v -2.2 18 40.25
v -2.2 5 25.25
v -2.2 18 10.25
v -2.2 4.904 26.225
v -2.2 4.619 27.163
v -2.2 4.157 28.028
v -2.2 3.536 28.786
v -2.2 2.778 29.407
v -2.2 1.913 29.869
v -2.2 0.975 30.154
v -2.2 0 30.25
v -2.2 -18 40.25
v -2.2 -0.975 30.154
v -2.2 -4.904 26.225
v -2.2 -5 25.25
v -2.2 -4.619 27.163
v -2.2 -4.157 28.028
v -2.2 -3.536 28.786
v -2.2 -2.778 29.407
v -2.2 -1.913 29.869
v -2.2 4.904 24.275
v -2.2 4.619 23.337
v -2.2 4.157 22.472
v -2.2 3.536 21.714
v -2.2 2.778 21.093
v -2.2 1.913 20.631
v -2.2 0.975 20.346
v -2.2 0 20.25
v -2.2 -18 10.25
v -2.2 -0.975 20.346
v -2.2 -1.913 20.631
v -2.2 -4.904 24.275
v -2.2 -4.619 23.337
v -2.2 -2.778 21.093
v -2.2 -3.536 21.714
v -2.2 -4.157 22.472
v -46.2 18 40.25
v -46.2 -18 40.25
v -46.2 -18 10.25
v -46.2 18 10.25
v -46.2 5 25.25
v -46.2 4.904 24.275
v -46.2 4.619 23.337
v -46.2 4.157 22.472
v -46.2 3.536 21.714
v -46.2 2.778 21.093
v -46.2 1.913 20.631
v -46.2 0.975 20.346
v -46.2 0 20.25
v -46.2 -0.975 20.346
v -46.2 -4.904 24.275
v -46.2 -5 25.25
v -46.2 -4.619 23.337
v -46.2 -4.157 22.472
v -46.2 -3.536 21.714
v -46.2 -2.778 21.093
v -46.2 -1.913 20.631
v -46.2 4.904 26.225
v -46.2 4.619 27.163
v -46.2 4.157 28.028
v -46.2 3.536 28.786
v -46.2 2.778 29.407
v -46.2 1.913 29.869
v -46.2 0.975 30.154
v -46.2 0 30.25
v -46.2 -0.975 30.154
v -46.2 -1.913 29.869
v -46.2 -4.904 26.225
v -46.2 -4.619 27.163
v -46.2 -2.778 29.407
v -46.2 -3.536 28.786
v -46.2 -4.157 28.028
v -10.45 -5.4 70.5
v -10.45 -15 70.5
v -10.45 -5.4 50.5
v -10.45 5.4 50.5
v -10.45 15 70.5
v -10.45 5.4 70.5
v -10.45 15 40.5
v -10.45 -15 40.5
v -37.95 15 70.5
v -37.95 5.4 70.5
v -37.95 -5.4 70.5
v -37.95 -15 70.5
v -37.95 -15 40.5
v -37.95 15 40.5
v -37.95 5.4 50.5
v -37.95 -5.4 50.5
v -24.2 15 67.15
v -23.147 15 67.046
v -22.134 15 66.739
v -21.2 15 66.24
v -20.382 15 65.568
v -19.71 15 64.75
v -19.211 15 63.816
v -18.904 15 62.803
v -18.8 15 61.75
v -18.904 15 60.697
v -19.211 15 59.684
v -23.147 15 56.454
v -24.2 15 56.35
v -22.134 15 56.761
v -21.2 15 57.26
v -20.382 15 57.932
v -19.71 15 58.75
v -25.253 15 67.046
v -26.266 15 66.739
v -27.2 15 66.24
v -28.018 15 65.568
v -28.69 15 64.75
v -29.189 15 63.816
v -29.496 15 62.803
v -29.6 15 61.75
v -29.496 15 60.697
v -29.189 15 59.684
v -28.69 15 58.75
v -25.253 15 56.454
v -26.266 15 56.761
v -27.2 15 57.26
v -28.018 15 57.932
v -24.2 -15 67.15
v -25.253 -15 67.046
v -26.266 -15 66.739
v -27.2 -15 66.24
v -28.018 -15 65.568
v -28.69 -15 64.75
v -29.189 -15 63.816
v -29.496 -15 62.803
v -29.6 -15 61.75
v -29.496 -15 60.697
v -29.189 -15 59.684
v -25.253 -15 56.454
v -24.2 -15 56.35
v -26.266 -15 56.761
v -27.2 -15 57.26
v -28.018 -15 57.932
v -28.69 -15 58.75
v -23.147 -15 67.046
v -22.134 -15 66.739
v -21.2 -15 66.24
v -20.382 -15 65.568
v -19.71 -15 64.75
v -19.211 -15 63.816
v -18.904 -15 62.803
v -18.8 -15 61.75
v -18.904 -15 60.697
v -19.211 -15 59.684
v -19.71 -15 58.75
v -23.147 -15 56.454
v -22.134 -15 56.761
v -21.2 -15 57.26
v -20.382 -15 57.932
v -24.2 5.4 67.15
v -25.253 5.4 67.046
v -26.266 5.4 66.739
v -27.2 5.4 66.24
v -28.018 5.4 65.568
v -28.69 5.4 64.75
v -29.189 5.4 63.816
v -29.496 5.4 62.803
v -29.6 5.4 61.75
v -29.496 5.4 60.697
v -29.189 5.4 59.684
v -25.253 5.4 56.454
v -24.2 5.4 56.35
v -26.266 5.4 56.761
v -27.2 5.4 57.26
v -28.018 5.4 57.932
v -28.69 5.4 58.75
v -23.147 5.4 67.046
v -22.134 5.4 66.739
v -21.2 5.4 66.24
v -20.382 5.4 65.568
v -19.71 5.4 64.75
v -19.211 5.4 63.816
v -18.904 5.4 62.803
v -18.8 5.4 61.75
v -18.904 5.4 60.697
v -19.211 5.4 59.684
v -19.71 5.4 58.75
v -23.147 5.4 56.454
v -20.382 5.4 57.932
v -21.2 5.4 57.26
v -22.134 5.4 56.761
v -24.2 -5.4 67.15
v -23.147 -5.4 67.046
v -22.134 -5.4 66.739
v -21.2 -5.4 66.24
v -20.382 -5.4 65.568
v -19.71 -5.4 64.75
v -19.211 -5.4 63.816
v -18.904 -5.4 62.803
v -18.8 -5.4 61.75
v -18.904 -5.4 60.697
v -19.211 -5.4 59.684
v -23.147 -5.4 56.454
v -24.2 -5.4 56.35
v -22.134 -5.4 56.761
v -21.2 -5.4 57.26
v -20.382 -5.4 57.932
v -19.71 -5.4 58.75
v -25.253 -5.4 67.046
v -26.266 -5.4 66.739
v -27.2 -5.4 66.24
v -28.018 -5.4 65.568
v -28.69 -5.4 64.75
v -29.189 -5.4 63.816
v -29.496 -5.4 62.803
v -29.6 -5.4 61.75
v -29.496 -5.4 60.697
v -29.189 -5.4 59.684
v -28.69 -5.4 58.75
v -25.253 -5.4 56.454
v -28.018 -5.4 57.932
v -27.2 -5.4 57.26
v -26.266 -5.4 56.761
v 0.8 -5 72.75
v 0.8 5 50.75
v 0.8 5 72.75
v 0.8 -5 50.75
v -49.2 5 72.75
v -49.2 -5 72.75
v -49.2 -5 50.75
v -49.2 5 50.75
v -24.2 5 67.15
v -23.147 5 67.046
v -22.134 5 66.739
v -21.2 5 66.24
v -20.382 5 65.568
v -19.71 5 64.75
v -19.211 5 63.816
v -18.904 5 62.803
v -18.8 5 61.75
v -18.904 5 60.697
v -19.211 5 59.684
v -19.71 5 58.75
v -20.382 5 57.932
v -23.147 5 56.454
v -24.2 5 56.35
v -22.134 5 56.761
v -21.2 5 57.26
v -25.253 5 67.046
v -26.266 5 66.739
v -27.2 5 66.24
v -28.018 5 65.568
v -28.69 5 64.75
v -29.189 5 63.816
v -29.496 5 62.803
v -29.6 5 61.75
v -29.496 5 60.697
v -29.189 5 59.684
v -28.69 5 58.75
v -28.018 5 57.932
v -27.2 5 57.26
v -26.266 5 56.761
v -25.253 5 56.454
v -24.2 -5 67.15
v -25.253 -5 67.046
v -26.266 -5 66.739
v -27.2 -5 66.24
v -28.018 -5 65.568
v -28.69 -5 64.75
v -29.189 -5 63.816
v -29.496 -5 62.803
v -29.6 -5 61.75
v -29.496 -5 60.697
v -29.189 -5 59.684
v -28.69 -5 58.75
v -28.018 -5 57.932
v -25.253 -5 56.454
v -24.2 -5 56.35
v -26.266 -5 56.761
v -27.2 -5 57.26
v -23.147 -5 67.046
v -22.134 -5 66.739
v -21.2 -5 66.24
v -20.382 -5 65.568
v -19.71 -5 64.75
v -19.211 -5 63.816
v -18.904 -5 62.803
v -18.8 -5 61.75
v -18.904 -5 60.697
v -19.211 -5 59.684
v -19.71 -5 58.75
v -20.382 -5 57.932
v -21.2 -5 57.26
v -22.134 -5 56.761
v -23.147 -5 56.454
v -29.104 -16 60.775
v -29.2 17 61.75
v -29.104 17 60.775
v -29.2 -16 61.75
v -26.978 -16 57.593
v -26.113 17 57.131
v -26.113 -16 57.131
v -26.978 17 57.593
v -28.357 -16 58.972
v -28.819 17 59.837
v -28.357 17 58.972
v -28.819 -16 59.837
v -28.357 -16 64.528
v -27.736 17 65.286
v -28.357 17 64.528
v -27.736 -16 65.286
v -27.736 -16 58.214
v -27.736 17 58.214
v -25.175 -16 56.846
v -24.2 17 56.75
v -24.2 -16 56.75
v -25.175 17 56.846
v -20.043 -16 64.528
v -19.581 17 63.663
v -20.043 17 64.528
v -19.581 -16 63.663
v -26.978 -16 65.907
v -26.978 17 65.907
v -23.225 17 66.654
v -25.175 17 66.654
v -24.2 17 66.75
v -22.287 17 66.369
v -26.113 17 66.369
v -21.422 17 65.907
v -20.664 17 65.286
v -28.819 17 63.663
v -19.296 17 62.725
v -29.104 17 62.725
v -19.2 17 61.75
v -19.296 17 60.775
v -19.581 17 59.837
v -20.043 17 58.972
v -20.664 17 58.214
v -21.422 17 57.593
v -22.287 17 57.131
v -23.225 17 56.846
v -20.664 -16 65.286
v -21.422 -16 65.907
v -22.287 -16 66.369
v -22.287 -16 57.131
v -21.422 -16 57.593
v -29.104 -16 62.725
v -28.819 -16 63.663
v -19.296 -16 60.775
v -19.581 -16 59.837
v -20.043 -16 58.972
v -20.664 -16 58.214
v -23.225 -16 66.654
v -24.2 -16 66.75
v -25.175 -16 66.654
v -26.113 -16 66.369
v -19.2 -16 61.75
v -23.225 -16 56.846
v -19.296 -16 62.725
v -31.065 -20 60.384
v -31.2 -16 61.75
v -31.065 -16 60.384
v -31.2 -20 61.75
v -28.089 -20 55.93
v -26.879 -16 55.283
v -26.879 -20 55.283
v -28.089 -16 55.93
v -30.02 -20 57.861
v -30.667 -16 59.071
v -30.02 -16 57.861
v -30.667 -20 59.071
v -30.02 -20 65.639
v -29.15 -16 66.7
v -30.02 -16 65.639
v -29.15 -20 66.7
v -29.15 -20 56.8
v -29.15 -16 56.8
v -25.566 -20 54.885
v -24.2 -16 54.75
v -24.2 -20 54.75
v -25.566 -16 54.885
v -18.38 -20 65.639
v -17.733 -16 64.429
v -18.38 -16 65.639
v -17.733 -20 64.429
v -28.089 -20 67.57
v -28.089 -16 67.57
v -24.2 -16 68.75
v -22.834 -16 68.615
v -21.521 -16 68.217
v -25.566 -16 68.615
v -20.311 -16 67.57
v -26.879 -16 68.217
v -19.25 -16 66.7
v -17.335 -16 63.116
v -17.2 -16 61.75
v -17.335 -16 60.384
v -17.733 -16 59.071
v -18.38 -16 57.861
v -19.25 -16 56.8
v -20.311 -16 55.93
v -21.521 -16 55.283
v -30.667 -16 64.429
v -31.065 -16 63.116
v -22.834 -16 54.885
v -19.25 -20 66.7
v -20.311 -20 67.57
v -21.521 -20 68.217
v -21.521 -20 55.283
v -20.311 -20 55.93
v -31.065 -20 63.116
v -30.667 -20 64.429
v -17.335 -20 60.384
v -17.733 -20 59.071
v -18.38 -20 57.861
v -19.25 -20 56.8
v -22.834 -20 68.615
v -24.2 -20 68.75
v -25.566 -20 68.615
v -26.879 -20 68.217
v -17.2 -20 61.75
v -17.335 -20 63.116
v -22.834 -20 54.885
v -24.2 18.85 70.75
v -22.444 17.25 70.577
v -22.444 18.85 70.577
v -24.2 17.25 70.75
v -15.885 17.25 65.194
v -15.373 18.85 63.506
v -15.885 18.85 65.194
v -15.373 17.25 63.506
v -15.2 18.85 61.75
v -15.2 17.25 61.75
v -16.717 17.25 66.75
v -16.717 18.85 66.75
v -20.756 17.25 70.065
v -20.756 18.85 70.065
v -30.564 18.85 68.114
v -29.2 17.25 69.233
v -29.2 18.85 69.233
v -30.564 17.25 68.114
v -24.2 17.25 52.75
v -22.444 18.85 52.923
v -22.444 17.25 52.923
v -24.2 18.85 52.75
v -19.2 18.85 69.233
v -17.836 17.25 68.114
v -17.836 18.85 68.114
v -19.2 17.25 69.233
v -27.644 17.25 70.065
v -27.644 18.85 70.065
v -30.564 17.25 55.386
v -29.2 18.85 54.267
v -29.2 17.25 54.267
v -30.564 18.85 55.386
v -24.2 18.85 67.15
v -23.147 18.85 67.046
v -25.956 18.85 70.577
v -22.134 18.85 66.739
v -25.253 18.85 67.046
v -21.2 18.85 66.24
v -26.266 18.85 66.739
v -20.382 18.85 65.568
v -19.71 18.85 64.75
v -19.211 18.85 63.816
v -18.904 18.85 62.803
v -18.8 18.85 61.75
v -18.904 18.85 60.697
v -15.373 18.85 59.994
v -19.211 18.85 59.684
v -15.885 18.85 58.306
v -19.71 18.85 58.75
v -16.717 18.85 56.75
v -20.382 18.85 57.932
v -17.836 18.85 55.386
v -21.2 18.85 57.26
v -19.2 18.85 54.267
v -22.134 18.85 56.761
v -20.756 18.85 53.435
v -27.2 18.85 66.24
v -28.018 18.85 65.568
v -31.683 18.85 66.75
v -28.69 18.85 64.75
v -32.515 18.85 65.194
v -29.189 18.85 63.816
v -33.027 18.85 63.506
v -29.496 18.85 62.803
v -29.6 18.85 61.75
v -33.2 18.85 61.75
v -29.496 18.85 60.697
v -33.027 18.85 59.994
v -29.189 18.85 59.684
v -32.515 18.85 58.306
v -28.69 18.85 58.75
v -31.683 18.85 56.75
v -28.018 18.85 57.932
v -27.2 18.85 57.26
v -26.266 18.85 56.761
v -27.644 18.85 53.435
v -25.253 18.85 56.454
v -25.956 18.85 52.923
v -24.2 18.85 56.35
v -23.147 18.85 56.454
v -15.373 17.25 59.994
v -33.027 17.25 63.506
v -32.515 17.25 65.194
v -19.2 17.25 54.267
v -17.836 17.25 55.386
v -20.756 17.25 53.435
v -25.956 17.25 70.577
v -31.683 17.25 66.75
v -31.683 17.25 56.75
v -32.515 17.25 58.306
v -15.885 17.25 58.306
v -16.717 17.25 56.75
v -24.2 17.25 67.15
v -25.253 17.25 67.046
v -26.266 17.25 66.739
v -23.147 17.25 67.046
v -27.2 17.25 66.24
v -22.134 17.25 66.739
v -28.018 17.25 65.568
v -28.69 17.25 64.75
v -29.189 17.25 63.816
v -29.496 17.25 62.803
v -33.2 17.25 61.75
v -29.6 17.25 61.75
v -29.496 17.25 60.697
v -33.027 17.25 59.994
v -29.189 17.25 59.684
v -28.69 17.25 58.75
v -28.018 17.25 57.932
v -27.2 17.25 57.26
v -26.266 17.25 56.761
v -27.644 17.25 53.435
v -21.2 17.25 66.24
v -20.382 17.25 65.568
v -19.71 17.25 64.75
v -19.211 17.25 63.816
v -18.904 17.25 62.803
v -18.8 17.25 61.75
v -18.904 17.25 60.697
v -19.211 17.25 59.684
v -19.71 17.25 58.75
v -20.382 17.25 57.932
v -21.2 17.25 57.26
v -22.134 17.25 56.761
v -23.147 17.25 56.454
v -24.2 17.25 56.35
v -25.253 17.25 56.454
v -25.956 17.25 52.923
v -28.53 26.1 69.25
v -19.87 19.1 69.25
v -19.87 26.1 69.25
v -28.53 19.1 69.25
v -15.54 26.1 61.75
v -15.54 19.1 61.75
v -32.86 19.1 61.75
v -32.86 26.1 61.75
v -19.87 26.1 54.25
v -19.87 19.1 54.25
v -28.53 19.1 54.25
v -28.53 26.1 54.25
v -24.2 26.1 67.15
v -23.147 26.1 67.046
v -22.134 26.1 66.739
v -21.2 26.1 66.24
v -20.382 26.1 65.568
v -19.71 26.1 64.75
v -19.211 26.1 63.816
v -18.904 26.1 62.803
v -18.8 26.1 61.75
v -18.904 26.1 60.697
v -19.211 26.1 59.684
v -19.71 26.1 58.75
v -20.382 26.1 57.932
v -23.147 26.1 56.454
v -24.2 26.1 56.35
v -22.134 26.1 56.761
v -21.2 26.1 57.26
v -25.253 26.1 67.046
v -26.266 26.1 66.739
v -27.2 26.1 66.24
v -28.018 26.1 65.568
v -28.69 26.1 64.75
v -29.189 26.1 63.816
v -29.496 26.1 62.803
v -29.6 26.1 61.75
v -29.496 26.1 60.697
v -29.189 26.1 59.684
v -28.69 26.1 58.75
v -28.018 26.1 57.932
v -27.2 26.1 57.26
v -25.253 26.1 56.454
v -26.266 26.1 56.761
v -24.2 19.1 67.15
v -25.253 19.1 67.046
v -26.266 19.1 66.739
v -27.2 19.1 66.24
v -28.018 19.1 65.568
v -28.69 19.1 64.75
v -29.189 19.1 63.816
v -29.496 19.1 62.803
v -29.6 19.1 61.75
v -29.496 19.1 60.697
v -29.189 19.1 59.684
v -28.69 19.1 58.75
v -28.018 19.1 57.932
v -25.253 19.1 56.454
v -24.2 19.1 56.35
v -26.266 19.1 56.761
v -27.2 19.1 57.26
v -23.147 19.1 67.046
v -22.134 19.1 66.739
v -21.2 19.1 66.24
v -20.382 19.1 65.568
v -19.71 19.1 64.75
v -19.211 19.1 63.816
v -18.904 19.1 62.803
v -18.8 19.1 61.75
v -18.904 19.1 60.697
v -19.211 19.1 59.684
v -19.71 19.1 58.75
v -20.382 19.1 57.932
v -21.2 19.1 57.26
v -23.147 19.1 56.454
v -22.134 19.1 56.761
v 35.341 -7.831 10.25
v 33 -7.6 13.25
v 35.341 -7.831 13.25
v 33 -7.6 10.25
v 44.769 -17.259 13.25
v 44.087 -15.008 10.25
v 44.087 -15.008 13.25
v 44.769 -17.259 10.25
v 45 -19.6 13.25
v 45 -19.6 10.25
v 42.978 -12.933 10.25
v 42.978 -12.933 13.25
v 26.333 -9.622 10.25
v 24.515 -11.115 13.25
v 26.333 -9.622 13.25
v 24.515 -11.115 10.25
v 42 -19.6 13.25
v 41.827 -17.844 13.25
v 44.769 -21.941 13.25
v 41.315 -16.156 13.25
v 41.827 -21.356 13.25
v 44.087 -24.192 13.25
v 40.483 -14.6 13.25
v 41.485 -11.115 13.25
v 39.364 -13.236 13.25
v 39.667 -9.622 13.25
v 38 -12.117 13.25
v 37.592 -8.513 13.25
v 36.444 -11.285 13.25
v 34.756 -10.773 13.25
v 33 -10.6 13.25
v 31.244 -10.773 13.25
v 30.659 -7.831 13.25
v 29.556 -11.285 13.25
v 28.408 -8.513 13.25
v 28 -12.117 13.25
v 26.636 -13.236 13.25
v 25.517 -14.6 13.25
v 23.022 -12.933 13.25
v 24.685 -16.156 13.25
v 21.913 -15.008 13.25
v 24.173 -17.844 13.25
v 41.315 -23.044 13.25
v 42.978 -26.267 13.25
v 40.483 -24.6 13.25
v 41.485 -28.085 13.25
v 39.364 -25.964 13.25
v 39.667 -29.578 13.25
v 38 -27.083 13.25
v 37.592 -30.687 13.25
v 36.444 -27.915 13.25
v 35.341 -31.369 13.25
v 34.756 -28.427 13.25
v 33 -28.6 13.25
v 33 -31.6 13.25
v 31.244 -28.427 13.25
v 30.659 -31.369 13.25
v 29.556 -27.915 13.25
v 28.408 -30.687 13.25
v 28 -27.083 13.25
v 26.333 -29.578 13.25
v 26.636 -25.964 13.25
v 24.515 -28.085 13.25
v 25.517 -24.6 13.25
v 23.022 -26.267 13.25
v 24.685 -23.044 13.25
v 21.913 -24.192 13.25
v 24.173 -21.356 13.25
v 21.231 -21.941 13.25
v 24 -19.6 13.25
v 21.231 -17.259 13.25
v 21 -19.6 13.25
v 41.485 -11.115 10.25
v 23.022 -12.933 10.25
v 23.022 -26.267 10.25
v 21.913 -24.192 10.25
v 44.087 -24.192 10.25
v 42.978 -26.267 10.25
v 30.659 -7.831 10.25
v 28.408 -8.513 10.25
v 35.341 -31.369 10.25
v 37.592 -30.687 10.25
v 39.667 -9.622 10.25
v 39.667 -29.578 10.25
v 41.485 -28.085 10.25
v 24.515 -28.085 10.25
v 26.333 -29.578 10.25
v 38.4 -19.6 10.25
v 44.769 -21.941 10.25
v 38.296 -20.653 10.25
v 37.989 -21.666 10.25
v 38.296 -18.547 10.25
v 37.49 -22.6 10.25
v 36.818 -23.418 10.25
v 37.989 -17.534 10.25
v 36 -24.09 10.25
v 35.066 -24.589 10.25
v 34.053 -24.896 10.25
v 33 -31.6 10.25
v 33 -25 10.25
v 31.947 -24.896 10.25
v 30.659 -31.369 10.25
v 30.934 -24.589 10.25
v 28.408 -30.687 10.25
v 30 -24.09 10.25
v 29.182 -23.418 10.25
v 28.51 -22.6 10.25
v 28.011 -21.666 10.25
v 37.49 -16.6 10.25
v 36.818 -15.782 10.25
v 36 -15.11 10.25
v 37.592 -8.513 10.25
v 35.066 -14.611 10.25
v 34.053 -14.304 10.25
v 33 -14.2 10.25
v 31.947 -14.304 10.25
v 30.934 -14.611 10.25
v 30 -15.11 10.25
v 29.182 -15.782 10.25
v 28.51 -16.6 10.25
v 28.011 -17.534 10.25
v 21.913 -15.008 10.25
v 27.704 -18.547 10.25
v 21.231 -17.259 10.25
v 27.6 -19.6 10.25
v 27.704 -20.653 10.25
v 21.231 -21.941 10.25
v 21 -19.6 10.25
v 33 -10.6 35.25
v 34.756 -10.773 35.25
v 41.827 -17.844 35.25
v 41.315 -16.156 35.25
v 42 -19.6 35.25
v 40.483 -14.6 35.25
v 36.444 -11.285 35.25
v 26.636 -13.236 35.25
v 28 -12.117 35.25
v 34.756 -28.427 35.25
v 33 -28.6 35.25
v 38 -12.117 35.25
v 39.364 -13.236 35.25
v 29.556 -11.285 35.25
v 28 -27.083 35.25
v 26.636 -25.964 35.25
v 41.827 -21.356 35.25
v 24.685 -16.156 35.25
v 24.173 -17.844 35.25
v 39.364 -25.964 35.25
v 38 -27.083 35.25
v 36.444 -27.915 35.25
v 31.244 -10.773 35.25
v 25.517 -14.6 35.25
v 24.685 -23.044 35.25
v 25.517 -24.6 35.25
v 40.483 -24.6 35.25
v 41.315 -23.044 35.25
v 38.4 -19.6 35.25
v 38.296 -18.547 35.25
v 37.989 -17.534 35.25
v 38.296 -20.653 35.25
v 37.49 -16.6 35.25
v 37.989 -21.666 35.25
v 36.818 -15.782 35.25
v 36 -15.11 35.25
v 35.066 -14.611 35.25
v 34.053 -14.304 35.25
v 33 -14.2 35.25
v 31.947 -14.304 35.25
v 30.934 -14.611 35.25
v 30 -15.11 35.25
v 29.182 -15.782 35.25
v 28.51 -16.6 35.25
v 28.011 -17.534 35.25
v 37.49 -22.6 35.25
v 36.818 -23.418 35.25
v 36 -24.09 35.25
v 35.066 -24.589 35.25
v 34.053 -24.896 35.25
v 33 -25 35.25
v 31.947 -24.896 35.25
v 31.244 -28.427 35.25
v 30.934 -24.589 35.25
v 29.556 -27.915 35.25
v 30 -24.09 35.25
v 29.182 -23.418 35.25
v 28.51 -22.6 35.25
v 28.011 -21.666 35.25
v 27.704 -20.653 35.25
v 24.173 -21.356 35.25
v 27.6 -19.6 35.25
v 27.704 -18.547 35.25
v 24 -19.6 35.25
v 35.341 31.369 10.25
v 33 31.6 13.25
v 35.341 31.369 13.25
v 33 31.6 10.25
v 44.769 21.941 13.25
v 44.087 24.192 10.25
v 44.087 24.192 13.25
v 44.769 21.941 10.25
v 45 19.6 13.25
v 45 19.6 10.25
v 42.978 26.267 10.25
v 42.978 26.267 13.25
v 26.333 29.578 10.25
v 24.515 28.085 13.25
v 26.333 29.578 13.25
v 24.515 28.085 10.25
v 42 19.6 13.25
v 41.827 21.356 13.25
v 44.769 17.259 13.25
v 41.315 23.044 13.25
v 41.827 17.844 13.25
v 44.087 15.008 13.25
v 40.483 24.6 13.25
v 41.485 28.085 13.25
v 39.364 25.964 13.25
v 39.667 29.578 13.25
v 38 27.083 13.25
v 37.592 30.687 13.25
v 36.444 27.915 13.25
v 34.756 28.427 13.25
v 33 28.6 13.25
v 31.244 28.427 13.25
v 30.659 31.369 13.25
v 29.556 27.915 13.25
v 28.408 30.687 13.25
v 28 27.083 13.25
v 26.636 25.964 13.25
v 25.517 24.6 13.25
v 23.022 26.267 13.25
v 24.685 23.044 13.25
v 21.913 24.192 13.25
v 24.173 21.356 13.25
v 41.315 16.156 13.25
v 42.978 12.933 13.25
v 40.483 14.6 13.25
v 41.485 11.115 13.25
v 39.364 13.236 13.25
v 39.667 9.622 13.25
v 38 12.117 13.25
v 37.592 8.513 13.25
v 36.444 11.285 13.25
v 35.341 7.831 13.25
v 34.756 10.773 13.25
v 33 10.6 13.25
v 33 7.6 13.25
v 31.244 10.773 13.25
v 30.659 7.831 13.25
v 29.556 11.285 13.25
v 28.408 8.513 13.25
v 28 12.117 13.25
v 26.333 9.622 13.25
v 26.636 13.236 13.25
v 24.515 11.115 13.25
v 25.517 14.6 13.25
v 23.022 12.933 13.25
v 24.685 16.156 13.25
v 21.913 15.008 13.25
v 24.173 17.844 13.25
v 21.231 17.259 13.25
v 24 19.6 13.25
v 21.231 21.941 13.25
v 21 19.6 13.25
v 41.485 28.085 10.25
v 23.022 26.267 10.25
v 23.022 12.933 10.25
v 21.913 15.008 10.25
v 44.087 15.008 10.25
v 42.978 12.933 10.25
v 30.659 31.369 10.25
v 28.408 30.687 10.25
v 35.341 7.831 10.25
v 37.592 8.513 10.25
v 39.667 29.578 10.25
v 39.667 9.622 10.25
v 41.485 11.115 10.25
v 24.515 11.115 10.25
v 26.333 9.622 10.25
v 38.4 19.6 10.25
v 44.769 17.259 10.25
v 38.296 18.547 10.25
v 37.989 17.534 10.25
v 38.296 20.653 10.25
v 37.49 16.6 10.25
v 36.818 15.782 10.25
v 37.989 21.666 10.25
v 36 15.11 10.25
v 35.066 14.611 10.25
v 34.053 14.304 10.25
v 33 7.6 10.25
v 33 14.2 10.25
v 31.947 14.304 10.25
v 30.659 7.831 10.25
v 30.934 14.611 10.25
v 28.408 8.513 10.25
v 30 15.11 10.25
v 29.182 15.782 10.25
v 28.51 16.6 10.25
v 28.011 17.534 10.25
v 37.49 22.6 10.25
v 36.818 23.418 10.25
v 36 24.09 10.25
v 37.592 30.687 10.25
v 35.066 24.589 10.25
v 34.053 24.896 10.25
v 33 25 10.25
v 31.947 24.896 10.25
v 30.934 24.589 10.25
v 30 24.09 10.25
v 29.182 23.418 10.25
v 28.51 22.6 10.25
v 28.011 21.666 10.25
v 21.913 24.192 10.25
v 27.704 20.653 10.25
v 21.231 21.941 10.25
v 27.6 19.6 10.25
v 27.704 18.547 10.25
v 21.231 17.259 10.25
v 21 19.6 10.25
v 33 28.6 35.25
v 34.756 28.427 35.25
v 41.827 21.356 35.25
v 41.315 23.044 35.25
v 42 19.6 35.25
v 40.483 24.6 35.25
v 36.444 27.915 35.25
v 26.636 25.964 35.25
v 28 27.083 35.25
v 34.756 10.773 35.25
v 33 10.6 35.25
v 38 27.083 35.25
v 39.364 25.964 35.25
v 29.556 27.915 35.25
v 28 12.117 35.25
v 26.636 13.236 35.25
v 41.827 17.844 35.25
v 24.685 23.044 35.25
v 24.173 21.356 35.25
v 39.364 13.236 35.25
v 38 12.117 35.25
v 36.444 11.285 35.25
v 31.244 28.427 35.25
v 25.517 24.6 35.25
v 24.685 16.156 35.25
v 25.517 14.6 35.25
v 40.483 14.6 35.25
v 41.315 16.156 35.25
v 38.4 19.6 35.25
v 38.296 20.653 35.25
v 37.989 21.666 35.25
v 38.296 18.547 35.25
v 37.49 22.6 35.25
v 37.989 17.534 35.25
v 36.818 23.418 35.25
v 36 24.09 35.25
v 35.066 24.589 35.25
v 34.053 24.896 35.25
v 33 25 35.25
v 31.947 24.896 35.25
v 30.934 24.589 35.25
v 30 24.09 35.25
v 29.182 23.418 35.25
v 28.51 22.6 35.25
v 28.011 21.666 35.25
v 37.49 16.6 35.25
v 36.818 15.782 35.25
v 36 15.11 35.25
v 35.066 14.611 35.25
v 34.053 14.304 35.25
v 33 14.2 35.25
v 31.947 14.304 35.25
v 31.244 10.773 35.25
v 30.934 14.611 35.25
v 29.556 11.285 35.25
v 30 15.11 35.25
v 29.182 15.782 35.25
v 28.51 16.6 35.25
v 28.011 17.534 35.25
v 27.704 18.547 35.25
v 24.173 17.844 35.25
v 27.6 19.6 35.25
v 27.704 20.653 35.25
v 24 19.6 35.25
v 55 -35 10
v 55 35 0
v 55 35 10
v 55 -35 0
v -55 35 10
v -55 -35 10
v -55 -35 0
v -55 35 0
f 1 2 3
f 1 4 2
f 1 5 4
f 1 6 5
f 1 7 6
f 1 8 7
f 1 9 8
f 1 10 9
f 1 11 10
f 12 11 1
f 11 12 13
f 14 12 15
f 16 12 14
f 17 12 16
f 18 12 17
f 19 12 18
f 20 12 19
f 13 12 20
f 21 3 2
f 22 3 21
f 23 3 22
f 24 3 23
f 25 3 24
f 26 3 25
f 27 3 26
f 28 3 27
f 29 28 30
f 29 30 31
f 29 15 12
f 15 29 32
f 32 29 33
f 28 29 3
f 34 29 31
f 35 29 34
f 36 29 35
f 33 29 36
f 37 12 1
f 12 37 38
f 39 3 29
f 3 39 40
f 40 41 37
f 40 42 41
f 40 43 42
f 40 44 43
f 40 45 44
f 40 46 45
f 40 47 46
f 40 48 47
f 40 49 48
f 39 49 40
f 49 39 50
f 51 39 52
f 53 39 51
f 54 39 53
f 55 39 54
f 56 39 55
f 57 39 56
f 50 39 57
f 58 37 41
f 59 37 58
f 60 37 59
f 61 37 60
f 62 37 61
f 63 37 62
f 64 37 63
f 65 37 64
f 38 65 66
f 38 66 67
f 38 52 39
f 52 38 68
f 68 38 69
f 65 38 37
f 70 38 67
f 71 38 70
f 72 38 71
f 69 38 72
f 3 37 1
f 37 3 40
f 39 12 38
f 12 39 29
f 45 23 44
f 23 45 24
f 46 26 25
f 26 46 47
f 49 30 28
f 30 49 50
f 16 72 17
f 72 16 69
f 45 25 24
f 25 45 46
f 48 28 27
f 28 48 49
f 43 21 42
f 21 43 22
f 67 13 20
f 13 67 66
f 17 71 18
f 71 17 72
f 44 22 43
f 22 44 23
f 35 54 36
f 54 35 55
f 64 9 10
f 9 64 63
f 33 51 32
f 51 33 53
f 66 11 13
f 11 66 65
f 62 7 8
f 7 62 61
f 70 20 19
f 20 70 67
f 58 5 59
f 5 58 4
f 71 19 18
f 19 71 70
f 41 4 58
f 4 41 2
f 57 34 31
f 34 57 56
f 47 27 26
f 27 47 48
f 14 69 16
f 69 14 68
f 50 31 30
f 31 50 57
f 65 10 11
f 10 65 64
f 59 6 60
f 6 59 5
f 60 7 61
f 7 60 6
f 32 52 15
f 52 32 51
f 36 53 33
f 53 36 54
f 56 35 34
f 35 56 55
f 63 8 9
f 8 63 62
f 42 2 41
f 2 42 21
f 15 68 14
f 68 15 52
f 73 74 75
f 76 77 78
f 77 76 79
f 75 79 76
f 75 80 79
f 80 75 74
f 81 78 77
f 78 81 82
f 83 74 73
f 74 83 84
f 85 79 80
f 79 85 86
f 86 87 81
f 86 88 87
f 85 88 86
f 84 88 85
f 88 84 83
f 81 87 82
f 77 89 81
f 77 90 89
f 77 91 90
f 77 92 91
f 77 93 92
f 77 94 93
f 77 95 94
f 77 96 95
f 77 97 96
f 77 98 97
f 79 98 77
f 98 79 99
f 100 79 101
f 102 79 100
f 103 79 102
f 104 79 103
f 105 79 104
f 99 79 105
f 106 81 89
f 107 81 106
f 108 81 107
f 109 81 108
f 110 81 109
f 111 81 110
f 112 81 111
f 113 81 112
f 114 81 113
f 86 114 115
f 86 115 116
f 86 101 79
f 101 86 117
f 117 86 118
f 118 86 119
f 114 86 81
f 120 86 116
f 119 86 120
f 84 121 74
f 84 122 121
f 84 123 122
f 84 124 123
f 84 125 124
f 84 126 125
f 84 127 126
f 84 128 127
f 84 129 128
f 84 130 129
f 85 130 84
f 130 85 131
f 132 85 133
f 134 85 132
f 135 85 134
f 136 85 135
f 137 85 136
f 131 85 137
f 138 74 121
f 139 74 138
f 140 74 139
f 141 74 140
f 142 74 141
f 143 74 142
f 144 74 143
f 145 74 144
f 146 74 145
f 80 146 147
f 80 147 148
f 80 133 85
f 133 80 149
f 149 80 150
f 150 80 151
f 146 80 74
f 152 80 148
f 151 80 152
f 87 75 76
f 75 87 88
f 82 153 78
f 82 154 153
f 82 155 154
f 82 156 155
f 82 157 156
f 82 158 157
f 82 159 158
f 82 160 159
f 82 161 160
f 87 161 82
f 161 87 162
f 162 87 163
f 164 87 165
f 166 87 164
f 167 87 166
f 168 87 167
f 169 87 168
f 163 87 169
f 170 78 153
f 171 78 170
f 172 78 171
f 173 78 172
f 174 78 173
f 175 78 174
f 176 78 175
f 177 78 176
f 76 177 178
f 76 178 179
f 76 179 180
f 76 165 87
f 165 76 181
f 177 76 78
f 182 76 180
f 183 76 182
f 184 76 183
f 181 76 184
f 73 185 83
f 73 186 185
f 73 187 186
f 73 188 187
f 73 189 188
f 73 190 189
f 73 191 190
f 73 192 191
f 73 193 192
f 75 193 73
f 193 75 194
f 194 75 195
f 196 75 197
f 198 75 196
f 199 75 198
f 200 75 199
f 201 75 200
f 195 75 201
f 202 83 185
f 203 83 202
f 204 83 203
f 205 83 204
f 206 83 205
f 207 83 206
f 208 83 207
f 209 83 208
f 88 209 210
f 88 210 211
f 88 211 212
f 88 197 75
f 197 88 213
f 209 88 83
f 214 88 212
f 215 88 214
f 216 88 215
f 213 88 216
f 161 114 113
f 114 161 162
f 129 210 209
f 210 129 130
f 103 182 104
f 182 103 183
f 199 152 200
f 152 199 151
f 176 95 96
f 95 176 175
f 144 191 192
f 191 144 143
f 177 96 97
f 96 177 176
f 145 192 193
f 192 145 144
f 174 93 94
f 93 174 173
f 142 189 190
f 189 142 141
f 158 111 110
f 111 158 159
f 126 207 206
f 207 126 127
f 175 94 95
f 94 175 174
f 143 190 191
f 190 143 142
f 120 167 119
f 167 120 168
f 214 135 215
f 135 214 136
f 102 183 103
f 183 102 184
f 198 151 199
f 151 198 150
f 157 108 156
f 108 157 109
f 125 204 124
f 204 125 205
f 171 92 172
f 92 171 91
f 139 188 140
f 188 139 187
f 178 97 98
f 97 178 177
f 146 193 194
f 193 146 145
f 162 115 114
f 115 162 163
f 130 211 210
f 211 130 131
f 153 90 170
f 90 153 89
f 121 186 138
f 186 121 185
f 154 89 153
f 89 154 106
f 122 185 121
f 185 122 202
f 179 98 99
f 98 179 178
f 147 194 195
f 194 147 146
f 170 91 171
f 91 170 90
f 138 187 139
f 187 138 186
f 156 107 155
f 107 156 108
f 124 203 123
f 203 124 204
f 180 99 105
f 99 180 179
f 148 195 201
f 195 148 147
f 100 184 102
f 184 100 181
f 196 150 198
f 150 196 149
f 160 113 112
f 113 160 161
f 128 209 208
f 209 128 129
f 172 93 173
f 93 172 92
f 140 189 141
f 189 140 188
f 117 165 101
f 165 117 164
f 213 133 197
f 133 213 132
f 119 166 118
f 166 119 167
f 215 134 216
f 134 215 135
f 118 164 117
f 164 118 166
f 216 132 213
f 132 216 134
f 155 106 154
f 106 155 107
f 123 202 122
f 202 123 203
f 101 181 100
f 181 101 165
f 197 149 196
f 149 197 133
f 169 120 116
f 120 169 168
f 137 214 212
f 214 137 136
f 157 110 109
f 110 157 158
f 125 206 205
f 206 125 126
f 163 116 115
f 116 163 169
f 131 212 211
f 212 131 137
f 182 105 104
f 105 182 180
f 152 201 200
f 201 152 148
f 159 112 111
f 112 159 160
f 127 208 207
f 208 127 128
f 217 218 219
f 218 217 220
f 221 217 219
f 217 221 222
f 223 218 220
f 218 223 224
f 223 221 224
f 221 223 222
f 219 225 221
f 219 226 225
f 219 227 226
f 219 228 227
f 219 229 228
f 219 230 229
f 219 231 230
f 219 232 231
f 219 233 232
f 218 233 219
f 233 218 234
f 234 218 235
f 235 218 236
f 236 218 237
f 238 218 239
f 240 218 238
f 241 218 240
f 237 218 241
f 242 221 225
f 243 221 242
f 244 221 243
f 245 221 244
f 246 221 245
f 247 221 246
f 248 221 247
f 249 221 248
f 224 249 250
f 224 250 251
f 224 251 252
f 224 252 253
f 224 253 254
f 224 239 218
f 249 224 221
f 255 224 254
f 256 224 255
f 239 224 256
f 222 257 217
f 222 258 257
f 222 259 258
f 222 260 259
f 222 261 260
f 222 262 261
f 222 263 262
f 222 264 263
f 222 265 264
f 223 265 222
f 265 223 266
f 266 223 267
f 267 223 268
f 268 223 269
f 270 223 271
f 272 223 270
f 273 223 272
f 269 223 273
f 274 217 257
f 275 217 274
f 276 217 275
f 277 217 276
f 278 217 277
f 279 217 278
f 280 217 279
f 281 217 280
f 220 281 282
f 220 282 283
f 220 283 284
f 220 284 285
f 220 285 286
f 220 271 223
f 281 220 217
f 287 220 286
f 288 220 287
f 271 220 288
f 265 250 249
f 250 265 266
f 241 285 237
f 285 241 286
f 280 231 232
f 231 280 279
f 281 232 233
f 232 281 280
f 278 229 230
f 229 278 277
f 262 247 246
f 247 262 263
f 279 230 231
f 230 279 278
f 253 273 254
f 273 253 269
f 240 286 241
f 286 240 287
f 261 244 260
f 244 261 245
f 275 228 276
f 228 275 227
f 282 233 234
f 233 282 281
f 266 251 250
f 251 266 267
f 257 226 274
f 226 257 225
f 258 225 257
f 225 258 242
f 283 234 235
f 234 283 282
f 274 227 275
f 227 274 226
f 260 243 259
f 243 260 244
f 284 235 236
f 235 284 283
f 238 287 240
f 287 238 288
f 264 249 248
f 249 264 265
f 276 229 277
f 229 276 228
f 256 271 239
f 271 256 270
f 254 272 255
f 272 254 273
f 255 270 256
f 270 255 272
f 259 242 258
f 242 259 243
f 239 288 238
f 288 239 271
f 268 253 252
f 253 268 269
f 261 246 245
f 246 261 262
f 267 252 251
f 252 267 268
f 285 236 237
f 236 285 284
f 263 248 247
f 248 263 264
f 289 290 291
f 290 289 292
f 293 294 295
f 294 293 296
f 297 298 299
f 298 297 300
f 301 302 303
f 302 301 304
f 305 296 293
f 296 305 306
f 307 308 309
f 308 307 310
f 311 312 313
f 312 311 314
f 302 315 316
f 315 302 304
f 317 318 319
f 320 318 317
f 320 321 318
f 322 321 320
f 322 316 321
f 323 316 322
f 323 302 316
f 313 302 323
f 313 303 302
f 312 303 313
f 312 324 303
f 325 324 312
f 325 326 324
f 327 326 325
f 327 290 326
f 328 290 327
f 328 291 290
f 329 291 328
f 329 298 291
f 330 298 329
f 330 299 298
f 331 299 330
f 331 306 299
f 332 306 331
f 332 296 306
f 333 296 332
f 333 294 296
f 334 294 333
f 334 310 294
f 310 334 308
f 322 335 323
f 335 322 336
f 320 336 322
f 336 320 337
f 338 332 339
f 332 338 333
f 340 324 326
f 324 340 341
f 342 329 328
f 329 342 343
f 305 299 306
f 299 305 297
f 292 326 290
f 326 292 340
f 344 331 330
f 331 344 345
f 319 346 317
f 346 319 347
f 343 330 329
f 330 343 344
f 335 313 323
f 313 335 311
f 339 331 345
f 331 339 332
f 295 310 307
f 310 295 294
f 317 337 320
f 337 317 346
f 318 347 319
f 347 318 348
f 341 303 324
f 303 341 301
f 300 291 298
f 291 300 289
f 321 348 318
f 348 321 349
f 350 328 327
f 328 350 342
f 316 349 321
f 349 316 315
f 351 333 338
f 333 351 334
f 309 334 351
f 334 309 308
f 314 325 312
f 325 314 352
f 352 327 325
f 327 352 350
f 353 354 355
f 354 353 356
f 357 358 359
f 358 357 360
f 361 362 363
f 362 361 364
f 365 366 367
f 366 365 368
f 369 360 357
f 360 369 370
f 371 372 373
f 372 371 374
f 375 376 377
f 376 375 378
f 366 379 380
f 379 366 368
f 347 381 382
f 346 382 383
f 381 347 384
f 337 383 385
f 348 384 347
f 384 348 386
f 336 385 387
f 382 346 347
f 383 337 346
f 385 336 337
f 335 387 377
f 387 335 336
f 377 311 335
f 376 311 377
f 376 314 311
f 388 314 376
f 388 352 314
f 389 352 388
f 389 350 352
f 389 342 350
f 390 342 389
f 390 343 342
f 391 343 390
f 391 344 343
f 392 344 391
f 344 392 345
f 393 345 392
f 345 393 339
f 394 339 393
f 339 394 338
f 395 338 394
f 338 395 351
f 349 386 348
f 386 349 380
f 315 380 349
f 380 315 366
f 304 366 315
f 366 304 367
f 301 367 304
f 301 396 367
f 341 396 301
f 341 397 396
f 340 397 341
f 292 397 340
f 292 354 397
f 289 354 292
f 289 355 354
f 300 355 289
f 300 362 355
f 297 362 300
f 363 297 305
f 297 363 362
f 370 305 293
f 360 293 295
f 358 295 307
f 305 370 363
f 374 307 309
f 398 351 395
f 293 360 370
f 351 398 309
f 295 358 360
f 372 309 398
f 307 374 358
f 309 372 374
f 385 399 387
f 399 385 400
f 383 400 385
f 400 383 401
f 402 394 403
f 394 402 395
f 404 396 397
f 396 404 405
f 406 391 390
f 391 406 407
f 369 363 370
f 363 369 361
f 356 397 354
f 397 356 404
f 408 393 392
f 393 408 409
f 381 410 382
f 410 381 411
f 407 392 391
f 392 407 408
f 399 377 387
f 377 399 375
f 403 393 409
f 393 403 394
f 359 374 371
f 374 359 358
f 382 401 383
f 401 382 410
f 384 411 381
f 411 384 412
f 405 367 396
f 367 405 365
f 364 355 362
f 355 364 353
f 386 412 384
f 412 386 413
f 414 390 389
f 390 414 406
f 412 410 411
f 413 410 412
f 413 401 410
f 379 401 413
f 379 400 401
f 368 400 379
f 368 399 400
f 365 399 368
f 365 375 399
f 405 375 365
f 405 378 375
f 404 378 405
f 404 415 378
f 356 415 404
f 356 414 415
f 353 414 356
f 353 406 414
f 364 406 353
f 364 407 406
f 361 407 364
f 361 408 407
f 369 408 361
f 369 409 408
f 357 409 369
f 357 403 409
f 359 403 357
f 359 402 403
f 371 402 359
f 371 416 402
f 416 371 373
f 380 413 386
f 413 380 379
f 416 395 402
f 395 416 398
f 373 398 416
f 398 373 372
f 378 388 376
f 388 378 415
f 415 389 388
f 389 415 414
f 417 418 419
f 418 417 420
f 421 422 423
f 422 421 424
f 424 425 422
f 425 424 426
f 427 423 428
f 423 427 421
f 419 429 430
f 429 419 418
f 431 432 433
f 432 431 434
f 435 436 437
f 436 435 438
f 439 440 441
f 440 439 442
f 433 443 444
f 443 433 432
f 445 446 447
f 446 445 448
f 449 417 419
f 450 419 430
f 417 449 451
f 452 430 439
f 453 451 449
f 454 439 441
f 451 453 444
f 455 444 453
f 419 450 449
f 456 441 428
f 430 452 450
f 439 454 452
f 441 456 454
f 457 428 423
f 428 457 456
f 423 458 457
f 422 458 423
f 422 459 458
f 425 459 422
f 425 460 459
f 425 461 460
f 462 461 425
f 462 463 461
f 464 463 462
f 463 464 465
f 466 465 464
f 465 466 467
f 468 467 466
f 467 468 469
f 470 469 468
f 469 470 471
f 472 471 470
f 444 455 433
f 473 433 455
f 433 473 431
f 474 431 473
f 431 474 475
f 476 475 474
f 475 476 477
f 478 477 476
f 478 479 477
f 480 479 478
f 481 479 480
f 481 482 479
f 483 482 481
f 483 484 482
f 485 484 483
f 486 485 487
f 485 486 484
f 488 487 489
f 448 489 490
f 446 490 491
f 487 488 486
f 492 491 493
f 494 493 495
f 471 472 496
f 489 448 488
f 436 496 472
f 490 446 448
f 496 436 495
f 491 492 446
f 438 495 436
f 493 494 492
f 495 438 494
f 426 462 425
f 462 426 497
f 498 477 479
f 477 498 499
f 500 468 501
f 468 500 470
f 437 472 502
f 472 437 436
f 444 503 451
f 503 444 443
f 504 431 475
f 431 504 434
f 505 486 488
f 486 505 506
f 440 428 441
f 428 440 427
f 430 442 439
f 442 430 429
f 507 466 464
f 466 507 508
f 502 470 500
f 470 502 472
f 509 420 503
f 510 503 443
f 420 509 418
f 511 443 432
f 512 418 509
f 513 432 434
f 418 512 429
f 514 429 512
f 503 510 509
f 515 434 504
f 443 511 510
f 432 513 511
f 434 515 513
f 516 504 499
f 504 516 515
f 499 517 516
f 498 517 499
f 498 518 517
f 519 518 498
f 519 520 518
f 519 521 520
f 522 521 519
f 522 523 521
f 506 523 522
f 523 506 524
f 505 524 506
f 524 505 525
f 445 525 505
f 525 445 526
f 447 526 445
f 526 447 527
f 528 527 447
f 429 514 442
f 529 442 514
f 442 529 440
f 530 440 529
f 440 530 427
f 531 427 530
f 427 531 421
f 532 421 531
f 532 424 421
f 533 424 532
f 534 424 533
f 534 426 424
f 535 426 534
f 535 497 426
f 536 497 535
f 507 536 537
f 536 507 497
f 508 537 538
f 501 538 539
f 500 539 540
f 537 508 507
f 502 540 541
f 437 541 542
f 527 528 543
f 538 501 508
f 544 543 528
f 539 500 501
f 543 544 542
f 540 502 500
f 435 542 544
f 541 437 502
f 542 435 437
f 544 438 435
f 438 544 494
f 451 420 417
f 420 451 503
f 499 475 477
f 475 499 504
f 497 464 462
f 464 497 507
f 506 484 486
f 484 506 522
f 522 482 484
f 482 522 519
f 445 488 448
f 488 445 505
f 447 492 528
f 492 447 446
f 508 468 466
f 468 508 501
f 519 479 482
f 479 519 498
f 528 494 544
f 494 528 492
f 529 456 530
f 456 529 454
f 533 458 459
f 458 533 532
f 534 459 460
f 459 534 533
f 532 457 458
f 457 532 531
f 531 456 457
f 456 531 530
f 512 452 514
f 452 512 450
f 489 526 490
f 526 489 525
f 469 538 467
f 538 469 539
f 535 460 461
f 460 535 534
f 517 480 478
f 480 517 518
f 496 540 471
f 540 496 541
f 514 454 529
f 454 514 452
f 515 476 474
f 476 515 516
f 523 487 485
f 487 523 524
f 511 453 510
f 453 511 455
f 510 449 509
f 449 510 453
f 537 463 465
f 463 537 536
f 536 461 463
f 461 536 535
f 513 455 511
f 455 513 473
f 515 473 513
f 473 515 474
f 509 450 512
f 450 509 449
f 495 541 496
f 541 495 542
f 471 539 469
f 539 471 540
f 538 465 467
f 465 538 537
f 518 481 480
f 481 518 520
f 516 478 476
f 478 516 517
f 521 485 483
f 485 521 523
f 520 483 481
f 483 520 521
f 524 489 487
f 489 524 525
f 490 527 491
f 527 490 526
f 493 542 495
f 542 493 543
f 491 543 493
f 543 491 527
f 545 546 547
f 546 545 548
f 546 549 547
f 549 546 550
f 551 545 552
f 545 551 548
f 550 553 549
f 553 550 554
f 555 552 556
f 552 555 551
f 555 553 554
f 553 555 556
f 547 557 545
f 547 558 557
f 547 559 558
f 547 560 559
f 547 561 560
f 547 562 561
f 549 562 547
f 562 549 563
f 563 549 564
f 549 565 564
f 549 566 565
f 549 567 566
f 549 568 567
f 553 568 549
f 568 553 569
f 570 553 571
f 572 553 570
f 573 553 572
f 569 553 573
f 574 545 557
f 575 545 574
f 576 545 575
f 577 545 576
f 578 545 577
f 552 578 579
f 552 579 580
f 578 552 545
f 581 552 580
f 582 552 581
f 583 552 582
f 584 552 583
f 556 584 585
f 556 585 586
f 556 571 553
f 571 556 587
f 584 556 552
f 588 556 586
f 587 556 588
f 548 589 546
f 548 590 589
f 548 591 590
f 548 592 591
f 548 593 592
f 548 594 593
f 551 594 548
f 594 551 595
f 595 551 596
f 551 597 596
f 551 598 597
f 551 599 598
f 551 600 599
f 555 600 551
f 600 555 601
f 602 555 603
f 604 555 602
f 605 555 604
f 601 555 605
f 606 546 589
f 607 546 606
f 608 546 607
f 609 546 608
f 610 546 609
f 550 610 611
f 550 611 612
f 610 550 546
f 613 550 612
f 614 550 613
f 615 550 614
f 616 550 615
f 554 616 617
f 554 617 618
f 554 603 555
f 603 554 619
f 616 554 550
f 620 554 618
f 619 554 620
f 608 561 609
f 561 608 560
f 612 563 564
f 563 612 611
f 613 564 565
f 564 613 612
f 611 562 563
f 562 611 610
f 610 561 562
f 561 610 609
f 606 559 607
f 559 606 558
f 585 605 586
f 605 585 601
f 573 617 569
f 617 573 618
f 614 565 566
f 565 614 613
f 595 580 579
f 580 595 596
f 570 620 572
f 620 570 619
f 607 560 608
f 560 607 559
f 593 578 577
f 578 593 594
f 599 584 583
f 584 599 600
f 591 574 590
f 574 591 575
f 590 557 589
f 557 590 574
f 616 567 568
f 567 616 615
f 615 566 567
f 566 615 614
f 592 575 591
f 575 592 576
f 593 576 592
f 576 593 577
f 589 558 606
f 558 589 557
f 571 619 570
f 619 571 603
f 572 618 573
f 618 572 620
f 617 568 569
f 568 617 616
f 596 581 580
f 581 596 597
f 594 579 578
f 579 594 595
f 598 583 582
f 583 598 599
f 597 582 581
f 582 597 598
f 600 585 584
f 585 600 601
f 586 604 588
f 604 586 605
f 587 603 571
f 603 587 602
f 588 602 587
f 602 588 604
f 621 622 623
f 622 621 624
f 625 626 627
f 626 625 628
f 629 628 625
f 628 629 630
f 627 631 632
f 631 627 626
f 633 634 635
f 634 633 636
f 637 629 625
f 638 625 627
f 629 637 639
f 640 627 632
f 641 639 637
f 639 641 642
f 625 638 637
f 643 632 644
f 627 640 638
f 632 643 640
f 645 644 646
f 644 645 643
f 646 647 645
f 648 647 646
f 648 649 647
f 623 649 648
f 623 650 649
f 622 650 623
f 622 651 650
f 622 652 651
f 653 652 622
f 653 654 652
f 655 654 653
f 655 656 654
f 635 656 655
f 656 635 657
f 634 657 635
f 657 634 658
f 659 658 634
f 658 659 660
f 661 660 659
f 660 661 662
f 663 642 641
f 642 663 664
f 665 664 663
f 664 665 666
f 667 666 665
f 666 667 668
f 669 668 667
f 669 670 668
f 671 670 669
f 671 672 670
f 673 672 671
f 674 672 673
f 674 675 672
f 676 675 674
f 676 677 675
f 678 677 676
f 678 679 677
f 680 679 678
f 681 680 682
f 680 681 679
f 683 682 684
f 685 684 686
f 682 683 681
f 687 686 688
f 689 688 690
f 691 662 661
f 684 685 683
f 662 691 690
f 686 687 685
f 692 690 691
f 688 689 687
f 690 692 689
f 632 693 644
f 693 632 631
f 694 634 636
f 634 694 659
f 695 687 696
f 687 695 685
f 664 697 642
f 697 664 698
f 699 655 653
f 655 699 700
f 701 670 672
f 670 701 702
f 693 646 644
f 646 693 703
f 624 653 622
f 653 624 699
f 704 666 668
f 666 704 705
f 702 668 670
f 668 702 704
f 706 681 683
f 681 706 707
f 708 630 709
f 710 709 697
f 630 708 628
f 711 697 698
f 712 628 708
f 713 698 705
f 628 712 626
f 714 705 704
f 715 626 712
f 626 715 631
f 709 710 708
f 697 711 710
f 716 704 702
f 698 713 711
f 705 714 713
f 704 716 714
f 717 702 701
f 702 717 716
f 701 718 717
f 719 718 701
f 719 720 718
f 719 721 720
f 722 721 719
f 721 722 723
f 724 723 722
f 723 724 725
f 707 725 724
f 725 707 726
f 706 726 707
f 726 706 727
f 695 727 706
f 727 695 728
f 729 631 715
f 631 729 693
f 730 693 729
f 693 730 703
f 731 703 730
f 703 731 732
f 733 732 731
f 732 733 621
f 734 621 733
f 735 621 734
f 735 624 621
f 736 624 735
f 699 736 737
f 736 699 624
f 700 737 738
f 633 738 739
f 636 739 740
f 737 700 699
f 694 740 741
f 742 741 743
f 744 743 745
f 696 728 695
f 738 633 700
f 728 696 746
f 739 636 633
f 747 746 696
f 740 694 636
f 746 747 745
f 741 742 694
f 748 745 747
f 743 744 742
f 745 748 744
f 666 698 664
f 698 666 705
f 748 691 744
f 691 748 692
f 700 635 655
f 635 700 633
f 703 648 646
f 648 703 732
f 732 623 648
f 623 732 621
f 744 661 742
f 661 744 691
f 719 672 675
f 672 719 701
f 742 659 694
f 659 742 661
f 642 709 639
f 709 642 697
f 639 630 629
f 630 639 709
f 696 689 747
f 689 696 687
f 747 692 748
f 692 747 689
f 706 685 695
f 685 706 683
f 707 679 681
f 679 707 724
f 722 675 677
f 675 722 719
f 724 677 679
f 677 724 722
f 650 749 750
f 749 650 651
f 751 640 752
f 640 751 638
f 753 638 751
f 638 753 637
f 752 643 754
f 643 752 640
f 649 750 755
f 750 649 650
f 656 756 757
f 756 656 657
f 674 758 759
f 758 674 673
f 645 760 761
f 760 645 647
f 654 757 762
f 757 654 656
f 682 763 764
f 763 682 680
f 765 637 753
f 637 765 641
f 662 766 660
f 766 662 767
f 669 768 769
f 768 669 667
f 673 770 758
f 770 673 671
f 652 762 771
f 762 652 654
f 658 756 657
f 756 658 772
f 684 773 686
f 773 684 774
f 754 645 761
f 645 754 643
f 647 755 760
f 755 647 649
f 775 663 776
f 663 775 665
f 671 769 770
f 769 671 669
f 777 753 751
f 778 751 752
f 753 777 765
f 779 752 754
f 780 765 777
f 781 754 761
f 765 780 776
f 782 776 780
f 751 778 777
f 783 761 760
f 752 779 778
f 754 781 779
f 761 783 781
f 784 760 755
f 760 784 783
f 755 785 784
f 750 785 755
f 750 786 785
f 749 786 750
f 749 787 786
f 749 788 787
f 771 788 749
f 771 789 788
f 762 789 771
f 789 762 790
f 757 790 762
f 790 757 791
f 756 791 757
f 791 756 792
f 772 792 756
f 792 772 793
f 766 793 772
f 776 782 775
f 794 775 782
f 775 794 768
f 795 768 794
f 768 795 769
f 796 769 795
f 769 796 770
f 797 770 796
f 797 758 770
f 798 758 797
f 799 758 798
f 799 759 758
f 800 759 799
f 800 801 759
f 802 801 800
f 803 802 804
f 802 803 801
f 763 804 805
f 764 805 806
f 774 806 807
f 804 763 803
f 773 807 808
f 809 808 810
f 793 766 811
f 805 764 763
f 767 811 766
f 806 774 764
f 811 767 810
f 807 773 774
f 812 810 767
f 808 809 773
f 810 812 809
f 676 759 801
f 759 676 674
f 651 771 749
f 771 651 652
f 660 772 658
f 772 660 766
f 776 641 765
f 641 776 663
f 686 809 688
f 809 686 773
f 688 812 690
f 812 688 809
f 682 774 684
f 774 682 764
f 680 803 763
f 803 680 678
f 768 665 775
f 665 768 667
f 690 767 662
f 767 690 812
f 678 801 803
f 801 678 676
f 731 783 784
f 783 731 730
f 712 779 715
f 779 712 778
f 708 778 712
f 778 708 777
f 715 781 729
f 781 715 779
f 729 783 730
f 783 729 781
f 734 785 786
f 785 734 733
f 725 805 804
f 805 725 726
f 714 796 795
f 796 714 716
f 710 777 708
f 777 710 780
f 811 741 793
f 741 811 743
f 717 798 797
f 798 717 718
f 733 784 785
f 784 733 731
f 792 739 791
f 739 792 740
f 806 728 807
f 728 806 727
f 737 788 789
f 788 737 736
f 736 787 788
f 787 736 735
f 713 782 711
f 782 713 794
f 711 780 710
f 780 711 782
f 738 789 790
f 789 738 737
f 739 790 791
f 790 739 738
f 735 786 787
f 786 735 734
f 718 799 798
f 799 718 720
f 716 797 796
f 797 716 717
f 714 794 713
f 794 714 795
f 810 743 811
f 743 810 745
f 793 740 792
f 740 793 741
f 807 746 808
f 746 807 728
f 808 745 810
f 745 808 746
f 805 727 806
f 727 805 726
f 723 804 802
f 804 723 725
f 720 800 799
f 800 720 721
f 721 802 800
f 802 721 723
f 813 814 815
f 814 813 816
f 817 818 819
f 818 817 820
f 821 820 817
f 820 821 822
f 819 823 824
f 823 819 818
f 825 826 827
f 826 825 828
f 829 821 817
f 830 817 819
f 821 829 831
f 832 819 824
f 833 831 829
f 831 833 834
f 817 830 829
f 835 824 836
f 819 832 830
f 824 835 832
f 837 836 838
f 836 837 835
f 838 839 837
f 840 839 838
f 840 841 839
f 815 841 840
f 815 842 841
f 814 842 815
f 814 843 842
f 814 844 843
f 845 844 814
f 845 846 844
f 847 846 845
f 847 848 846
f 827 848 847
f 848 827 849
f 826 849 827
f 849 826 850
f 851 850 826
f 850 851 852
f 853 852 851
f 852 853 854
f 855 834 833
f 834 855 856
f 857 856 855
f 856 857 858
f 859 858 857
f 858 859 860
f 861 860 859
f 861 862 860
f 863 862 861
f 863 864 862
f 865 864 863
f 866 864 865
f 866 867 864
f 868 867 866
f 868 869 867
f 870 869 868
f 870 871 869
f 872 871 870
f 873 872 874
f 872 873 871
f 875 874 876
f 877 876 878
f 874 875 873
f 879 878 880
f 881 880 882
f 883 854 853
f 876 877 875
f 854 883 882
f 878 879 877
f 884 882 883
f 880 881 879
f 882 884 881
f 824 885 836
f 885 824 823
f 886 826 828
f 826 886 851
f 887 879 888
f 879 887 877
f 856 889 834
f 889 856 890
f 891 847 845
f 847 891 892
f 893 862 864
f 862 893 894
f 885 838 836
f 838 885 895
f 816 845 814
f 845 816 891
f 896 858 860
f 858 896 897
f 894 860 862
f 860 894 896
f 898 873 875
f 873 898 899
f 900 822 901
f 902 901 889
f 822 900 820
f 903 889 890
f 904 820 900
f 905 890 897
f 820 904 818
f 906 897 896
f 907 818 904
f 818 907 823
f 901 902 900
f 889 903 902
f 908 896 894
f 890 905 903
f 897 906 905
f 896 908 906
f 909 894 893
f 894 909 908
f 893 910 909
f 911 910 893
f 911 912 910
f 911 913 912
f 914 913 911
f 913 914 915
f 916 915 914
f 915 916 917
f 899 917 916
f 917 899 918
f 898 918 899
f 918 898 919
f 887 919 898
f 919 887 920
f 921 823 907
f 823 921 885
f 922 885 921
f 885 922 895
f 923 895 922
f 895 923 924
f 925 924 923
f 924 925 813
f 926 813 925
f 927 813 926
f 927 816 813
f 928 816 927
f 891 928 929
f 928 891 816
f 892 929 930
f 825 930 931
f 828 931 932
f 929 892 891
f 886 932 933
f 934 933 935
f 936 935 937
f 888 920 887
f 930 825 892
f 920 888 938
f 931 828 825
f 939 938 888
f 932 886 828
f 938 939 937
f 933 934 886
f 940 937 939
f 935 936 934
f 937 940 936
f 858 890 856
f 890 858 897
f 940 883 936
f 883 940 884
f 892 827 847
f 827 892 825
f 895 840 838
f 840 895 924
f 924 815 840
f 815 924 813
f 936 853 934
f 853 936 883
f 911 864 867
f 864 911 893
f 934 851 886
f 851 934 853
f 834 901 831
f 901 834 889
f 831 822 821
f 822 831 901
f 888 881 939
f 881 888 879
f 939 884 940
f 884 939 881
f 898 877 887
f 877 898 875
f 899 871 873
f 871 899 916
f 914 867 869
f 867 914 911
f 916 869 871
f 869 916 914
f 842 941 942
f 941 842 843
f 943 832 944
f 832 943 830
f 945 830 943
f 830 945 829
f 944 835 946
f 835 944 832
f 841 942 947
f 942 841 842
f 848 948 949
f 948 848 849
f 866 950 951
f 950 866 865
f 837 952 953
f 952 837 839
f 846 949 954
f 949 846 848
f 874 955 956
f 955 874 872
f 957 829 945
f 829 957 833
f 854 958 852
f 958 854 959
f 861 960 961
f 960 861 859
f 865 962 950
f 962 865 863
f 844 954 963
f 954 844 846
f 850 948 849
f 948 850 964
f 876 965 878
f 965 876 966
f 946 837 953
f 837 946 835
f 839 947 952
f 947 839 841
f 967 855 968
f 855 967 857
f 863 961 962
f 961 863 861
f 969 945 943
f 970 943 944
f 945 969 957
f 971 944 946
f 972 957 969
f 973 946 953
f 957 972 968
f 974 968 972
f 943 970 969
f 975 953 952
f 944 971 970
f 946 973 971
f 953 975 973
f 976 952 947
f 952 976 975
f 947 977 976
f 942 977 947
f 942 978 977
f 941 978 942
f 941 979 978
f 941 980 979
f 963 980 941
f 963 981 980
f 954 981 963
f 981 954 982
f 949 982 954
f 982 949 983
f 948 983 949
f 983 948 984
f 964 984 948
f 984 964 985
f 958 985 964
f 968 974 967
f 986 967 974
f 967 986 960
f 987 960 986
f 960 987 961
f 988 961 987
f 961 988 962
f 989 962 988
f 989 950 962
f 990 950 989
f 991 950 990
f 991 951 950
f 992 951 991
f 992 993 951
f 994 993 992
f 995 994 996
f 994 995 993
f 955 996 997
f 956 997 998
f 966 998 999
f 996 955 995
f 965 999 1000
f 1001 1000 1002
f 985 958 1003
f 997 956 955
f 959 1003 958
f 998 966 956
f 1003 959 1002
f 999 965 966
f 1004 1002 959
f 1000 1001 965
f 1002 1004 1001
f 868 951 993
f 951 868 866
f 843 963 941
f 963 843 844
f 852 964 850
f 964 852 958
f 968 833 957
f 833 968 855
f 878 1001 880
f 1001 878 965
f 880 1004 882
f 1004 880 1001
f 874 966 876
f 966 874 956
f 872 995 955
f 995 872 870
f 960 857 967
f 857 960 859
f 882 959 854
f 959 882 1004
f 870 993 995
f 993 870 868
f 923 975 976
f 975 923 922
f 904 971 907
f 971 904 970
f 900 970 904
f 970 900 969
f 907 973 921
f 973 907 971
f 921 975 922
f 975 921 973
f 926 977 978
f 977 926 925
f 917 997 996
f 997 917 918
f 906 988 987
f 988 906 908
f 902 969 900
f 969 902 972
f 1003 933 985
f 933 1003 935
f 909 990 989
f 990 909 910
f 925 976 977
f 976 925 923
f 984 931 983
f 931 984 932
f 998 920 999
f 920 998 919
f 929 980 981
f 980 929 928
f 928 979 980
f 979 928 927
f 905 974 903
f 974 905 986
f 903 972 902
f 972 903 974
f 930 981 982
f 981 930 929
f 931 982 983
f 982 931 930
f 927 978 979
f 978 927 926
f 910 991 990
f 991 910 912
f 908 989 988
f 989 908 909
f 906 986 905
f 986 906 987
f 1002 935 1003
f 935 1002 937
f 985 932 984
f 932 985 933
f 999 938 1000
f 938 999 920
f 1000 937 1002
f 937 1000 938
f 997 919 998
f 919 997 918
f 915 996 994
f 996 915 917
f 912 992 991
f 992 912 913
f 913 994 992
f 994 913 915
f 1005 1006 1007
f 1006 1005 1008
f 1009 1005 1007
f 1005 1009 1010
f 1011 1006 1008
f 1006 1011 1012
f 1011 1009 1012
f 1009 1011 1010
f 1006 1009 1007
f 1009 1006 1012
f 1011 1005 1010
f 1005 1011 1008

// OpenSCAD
$fn = 32;

// ------------------------------------------------------------------------
// Indexing jig: plate 110 x 70 mm, pin d10
// Every part is its own module, assembly() places every instance.
// ------------------------------------------------------------------------

// --- part 1 ---
module jig_plate() {
  difference() {
    translate([-55, -35, 0]) cube([110, 70, 10]);
  }
}

// --- part 2 ---
module locator_block() {
  difference() {
    translate([-22, -18, 0]) cube([44, 36, 30]);
    translate([0, 0, 15]) rotate([0, 90, 0]) cylinder(h = 46, d = 10, center = true);
  }
}

// --- part 3 ---
module index_fork() {
  difference() {
    translate([-13.75, -15, 0]) cube([27.5, 30, 30]);
    translate([-14.75, -5.4, 10]) cube([29.5, 10.8, 21]);
    translate([0, 0, 21.25]) rotate([90, 0, 0]) cylinder(h = 32, d = 10.8, center = true);
  }
}

// --- part 4 ---
module index_arm() {
  difference() {
    translate([-25, -5, 0]) cube([50, 10, 22]);
    translate([0, 0, 11]) rotate([90, 0, 0]) cylinder(h = 12, d = 10.8, center = true);
  }
}

// --- part 5 ---
module index_pin() {
  rotate([0, 90, 0]) cylinder(h = 34, d = 10, center = true);
  translate([-20, 0, 0]) rotate([0, 90, 0]) cylinder(h = 4, d = 14);
}

// --- part 6 ---
module pin_washer() {
  difference() {
      translate([0, 0, 0]) cylinder(h = 1.6, d = 18);
      translate([0, 0, -1]) cylinder(h = 3.6, d = 10.8);
    }
}

// --- part 7 ---
module lock_nut() {
  difference() {
    linear_extrude(height = 7) polygon(points = [[8.66, 0], [4.33, 7.5], [-4.33, 7.5], [-8.66, 0], [-4.33, -7.5], [4.33, -7.5]]);
    translate([0, 0, -1]) cylinder(h = 9, d = 10.8);
  }
}

// --- part 8 ---
module guide_bush_a() {
  difference() {
    union() {
      cylinder(h = 3, d = 24);
      translate([0, 0, 3]) cylinder(h = 22, d = 18);
    }
    translate([0, 0, -1]) cylinder(h = 27, d = 10.8);
  }
}

// --- part 9 ---
module guide_bush_b() {
  difference() {
    union() {
      cylinder(h = 3, d = 24);
      translate([0, 0, 3]) cylinder(h = 22, d = 18);
    }
    translate([0, 0, -1]) cylinder(h = 27, d = 10.8);
  }
}

// --- assembly ---
module assembly() {
  color([0.80, 0.24, 0.20]) translate([0, 0, 0]) rotate([0, 0, 0]) jig_plate();
  color([0.20, 0.45, 0.75]) translate([-24.2, 0, 10.25]) rotate([0, 0, 0]) locator_block();
  color([0.25, 0.62, 0.32]) translate([-24.2, 0, 40.5]) rotate([0, 0, 0]) index_fork();
  color([0.92, 0.70, 0.18]) translate([-24.2, 0, 50.75]) rotate([0, 0, 0]) index_arm();
  color([0.58, 0.35, 0.70]) translate([-24.2, 0, 61.75]) rotate([0, 0, 90]) index_pin();
  color([0.16, 0.66, 0.66]) translate([-24.2, 18.85, 61.75]) rotate([90, 0, 0]) pin_washer();
  color([0.85, 0.48, 0.18]) translate([-24.2, 26.1, 61.75]) rotate([90, 0, 0]) lock_nut();
  color([0.55, 0.60, 0.65]) translate([33, -19.6, 10.25]) rotate([0, 0, 0]) guide_bush_a();
  color([0.75, 0.30, 0.55]) translate([33, 19.6, 10.25]) rotate([0, 0, 0]) guide_bush_b();
}

assembly();
